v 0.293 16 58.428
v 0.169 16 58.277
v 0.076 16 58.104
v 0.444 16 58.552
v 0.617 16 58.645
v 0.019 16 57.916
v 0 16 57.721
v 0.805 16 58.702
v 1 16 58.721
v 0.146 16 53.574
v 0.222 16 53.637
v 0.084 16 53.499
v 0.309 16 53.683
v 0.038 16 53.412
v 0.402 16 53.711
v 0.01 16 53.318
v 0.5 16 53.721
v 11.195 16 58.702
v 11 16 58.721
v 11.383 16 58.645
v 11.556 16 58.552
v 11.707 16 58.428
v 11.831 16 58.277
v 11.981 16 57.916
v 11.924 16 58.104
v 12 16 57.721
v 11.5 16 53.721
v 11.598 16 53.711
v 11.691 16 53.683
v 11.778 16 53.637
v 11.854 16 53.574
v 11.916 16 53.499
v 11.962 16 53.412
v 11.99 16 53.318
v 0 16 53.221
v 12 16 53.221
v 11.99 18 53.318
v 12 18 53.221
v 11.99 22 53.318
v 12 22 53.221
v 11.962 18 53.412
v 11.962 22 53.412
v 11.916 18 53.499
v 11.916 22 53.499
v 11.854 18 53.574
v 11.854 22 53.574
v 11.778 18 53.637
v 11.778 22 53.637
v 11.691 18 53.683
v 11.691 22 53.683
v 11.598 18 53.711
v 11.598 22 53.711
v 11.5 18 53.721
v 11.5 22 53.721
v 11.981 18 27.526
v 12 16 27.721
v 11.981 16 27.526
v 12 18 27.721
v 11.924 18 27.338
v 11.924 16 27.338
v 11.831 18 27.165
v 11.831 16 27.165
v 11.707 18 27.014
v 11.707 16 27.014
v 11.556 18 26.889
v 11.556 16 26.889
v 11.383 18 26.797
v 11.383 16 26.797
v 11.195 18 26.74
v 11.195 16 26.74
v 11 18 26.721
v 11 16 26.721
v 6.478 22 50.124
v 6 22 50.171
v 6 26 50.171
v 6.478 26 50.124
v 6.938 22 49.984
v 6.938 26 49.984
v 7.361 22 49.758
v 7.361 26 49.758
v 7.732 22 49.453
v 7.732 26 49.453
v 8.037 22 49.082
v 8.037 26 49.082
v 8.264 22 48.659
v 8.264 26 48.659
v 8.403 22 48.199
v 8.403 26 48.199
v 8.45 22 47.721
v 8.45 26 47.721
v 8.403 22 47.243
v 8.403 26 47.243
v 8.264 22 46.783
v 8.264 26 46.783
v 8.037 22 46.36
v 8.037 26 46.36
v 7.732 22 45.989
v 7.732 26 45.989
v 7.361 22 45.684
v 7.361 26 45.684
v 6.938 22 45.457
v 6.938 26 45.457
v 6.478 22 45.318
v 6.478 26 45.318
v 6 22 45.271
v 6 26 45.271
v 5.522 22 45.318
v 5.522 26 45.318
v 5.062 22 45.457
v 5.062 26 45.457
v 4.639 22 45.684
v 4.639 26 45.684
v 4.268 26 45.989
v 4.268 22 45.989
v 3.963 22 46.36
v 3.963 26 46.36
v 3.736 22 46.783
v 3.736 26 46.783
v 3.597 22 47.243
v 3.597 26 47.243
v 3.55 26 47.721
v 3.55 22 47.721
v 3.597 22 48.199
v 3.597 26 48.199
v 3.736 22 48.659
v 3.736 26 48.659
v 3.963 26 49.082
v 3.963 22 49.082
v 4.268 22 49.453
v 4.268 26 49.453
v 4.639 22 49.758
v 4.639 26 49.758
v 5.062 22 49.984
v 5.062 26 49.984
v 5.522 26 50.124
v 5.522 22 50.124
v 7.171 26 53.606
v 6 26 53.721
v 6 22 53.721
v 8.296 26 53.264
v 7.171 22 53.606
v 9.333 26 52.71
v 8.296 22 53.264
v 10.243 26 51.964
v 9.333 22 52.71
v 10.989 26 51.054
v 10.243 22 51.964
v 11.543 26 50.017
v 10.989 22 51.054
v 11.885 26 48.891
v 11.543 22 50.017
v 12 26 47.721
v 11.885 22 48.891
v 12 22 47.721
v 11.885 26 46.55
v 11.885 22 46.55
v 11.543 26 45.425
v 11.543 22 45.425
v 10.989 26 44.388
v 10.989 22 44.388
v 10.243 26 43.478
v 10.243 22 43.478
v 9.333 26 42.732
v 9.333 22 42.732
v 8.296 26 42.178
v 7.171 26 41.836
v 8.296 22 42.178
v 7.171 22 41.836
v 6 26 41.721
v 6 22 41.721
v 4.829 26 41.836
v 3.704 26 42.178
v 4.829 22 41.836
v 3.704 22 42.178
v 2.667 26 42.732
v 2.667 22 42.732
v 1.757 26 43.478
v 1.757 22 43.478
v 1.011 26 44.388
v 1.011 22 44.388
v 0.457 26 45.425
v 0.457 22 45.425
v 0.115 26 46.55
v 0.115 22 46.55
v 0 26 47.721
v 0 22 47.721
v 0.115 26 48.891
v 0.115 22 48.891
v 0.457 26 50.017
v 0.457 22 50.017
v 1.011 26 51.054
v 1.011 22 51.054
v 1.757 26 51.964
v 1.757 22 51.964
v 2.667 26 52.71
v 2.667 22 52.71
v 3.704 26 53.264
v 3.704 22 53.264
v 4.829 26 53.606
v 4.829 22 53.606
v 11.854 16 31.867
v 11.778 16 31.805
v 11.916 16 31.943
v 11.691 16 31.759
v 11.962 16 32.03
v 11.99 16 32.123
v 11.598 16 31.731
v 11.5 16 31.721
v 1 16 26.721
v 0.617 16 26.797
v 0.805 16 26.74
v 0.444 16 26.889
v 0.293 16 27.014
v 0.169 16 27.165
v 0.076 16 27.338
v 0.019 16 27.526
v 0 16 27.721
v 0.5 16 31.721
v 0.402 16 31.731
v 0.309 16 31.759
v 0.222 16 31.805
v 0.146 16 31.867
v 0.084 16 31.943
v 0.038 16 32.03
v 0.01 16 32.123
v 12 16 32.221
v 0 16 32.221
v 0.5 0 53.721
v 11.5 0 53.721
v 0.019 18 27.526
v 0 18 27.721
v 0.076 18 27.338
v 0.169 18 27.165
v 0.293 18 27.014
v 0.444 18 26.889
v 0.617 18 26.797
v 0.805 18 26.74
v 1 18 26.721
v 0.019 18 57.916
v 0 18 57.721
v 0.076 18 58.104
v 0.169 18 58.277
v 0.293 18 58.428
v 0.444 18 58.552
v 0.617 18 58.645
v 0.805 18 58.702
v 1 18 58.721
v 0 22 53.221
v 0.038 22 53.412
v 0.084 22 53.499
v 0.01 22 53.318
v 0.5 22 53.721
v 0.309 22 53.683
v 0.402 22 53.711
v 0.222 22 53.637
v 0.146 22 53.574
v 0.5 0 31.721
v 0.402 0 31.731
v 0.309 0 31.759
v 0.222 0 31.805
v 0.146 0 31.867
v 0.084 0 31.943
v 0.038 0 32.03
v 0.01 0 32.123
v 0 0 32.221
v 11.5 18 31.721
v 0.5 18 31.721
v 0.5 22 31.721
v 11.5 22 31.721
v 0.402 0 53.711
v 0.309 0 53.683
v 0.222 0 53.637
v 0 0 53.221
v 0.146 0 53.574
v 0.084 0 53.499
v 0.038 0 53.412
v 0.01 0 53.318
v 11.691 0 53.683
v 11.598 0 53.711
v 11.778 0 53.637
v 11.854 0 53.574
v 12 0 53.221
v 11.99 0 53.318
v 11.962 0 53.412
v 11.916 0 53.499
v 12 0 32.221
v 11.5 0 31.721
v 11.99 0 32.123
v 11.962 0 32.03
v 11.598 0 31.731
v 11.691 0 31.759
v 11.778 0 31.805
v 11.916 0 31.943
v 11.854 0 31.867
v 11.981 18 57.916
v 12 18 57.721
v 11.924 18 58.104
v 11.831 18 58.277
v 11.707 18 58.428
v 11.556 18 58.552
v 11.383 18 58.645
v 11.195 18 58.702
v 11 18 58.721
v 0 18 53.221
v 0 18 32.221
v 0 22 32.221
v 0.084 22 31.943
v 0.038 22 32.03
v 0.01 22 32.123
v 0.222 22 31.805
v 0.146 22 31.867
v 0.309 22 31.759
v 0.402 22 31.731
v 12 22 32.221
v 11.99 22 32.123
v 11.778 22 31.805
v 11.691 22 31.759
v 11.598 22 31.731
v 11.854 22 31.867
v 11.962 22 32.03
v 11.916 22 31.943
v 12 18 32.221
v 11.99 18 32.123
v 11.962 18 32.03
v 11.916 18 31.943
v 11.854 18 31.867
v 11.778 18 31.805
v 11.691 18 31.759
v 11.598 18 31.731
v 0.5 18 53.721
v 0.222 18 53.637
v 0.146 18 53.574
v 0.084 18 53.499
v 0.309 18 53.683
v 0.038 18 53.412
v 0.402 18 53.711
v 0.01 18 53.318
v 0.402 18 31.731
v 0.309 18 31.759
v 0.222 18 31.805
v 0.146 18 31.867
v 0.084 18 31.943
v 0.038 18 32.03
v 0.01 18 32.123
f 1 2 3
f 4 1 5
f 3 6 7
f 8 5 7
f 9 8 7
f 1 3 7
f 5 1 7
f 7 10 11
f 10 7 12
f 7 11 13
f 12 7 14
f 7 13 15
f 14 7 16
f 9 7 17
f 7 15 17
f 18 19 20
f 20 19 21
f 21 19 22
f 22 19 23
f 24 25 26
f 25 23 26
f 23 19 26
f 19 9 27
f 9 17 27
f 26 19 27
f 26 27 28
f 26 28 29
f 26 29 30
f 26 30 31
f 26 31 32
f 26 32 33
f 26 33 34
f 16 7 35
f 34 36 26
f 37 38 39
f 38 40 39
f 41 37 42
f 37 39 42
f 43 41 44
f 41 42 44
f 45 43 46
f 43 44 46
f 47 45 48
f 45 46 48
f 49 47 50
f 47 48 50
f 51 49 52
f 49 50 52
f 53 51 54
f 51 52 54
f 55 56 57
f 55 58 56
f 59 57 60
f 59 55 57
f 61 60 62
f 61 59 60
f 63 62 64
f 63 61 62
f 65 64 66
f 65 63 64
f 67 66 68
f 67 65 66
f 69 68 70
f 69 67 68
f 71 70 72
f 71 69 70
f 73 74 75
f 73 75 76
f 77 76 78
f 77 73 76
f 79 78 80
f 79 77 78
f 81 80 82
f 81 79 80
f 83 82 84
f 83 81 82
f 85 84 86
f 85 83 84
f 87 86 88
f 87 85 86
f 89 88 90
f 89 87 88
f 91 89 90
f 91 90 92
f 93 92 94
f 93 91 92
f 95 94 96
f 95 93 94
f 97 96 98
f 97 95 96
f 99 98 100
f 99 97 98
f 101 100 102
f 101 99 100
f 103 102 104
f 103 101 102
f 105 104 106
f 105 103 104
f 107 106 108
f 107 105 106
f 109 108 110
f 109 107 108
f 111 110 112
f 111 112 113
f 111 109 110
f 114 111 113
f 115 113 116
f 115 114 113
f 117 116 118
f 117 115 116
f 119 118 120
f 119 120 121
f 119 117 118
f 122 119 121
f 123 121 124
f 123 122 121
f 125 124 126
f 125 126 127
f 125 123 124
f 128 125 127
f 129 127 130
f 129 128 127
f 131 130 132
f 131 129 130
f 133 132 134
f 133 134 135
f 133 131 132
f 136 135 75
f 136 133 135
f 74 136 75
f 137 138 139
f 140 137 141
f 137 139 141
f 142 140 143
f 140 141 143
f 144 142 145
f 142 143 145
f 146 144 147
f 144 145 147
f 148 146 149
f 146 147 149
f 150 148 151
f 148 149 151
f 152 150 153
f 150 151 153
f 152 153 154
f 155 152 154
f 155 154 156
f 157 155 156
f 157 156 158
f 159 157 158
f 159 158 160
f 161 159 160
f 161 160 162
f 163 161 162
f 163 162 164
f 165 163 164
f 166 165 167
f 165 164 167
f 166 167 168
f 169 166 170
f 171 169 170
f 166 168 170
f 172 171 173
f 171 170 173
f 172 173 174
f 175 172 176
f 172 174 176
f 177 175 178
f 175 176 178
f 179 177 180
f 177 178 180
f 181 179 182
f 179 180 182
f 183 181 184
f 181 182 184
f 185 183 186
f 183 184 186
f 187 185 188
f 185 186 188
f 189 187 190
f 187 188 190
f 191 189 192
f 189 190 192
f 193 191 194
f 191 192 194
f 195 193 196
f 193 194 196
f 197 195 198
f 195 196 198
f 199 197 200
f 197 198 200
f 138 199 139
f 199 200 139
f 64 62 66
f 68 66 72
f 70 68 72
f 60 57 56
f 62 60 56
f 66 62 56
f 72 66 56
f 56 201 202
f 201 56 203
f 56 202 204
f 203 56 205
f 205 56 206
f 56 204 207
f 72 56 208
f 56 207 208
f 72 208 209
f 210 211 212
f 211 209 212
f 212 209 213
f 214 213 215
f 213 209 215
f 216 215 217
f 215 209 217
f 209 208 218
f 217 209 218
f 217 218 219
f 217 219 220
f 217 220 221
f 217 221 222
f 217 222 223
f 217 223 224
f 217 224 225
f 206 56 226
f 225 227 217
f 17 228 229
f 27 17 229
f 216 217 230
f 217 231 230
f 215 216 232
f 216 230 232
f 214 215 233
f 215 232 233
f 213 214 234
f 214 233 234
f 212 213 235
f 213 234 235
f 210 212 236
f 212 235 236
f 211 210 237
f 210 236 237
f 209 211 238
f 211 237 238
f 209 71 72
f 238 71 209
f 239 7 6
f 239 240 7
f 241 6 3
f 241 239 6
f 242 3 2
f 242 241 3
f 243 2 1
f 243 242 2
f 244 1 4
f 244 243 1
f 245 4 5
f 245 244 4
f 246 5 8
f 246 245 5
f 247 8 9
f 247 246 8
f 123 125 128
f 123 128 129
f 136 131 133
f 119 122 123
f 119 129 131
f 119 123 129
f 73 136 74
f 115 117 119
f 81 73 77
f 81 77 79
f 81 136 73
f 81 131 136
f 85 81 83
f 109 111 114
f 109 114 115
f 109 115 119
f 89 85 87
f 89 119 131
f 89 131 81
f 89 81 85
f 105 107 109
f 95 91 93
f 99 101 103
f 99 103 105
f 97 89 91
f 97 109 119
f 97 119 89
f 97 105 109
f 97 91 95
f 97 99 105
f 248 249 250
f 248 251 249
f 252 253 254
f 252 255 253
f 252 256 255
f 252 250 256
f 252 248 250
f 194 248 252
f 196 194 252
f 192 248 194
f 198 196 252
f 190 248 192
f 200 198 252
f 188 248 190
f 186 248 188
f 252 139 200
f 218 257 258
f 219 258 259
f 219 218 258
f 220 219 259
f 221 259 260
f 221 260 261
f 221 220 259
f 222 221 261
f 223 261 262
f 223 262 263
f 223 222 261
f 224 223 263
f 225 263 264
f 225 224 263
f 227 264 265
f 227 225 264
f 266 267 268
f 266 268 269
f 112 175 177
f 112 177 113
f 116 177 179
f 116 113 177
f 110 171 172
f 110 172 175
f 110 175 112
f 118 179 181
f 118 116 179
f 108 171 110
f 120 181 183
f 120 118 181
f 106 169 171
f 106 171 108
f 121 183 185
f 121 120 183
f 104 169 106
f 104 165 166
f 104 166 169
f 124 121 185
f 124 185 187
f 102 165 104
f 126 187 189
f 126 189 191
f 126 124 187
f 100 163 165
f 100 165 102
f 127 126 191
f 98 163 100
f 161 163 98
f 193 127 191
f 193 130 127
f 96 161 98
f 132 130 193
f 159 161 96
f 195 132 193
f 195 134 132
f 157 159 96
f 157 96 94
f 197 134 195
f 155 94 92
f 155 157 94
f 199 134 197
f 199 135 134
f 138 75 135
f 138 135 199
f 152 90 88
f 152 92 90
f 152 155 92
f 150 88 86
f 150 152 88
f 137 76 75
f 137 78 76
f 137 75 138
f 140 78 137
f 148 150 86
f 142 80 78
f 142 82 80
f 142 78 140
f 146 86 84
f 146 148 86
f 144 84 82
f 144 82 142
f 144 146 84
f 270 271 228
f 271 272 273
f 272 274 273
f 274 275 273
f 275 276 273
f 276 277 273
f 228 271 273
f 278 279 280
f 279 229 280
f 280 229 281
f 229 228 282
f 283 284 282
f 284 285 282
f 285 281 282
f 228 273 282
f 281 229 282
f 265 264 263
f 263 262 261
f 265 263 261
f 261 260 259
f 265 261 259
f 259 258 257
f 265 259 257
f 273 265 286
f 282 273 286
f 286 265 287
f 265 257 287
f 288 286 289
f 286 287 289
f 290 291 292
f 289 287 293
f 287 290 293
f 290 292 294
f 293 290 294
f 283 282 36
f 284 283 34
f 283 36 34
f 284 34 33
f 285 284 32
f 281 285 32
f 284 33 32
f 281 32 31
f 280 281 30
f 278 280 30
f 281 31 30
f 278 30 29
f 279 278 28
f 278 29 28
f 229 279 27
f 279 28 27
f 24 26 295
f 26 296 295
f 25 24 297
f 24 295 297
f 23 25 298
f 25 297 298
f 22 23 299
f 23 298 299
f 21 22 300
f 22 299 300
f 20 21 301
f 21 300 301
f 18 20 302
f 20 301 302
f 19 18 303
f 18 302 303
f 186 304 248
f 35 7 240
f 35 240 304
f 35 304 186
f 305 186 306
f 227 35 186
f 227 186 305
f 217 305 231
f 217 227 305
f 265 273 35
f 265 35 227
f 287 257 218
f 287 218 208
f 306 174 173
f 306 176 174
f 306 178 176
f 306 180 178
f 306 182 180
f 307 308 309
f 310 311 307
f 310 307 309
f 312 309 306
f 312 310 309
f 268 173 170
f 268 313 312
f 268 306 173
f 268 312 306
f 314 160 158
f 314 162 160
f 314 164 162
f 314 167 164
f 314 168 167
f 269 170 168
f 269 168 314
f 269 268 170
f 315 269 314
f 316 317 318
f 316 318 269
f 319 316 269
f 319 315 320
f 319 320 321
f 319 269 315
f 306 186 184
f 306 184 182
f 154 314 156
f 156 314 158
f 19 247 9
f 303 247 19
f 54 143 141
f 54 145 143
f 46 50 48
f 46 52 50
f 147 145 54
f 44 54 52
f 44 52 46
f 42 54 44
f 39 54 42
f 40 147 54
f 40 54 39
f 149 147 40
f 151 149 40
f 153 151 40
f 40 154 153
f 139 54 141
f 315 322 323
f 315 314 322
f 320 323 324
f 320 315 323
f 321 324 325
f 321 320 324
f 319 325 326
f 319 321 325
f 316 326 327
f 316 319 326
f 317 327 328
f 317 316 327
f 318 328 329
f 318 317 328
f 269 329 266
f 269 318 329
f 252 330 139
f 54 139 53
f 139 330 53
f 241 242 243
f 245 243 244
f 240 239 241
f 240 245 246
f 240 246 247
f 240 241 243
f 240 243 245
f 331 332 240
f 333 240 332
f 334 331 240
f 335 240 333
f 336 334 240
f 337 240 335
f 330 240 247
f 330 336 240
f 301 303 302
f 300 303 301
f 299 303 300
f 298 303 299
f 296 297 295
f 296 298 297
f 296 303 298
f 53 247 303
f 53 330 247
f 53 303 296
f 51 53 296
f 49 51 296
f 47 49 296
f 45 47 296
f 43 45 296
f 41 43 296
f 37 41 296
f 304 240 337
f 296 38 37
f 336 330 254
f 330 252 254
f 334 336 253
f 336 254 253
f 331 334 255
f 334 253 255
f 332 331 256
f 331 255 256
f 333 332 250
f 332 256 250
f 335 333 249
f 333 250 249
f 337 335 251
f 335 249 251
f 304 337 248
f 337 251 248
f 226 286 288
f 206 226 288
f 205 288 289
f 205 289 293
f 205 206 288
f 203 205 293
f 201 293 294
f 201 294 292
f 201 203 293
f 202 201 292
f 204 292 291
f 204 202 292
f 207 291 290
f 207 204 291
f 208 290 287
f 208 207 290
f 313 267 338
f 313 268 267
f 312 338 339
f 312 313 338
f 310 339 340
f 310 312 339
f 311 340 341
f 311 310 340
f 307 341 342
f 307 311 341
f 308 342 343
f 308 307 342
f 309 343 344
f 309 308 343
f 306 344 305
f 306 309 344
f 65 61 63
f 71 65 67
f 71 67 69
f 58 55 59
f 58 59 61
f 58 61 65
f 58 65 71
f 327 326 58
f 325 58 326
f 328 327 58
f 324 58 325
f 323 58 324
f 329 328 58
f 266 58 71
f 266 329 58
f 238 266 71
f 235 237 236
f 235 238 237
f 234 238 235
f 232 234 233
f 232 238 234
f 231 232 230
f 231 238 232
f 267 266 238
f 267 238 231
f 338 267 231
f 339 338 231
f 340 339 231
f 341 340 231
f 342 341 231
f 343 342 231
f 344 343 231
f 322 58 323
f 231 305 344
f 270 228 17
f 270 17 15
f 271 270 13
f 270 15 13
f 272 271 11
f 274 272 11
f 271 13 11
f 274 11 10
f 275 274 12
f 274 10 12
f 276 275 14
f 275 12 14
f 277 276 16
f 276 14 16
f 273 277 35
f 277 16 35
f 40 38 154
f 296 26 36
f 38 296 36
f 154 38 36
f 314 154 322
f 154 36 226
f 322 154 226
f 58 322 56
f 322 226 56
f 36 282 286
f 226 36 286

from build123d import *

# Parameters (mm, degrees)
SKETCH2_W           = 12
SKETCH2_H           = 22
BOSS_EXTRUDE1_DEPTH = 22
SKETCH3_R           = 6
SKETCH3_R_2         = 2.45
BOSS_EXTRUDE2_DEPTH = 4
SKETCH4_W           = 12
SKETCH4_H           = 2
BOSS_EXTRUDE3_DEPTH = 5
SKETCH5_W           = 12
SKETCH5_H           = 2
BOSS_EXTRUDE4_DEPTH = 5
FILLET1_R           = 1
FILLET2_R           = 0.5


with BuildPart() as part:
    # Sketch2 → Boss-Extrude1 (new body)
    with BuildSketch(Plane(origin=(0, 0, 0), x_dir=(1, 0, 0), z_dir=(0, 1, 0))):
        with Locations((6, -42.720930233)):
            Rectangle(SKETCH2_W, SKETCH2_H)
    extrude(amount=BOSS_EXTRUDE1_DEPTH)

    # Sketch3 → Boss-Extrude2 (add)
    with BuildSketch(Plane(origin=(0, 22, 0), x_dir=(1, 0, 0), z_dir=(0, 1, 0))):
        with Locations(Location((6, -47.720930233, 0), (0, 0, 270))):
            Circle(SKETCH3_R)
        with Locations(Location((6, -47.720930233, 0), (0, 0, 270))):
            Circle(SKETCH3_R_2, mode=Mode.SUBTRACT)
    extrude(amount=BOSS_EXTRUDE2_DEPTH)

    # Sketch4 → Boss-Extrude3 (add)
    with BuildSketch(Plane.XY.offset(53.720930233)):
        with Locations((6, 17)):
            Rectangle(SKETCH4_W, SKETCH4_H)
    extrude(amount=BOSS_EXTRUDE3_DEPTH)

    # Sketch5 → Boss-Extrude4 (add)
    with BuildSketch(Plane(origin=(0, 0, 31.720930233), x_dir=(-1, 0, 0), z_dir=(0, 0, -1))):
        with Locations((-6, 17)):
            Rectangle(SKETCH5_W, SKETCH5_H)
    extrude(amount=BOSS_EXTRUDE4_DEPTH)

    # Fillet1
    fillet1_edges = [part.edges().sort_by_distance(p)[0] for p in [
        (0, 17, 58.720930233),
        (12, 17, 58.720930233),
        (12, 17, 26.720930233),
        (0, 17, 26.720930233),
    ]]
    fillet(fillet1_edges, radius=FILLET1_R)

    # Fillet2
    fillet2_edges = [part.edges().sort_by_distance(p)[0] for p in [
        (12, 8, 53.720930233),
        (0, 8, 53.720930233),
        (0, 8, 31.720930233),
        (12, 8, 31.720930233),
        (0, 20, 31.720930233),
        (12, 20, 31.720930233),
        (12, 20, 53.720930233),
        (0, 20, 53.720930233),
    ]]
    fillet(fillet2_edges, radius=FILLET2_R)


solid = part.part
